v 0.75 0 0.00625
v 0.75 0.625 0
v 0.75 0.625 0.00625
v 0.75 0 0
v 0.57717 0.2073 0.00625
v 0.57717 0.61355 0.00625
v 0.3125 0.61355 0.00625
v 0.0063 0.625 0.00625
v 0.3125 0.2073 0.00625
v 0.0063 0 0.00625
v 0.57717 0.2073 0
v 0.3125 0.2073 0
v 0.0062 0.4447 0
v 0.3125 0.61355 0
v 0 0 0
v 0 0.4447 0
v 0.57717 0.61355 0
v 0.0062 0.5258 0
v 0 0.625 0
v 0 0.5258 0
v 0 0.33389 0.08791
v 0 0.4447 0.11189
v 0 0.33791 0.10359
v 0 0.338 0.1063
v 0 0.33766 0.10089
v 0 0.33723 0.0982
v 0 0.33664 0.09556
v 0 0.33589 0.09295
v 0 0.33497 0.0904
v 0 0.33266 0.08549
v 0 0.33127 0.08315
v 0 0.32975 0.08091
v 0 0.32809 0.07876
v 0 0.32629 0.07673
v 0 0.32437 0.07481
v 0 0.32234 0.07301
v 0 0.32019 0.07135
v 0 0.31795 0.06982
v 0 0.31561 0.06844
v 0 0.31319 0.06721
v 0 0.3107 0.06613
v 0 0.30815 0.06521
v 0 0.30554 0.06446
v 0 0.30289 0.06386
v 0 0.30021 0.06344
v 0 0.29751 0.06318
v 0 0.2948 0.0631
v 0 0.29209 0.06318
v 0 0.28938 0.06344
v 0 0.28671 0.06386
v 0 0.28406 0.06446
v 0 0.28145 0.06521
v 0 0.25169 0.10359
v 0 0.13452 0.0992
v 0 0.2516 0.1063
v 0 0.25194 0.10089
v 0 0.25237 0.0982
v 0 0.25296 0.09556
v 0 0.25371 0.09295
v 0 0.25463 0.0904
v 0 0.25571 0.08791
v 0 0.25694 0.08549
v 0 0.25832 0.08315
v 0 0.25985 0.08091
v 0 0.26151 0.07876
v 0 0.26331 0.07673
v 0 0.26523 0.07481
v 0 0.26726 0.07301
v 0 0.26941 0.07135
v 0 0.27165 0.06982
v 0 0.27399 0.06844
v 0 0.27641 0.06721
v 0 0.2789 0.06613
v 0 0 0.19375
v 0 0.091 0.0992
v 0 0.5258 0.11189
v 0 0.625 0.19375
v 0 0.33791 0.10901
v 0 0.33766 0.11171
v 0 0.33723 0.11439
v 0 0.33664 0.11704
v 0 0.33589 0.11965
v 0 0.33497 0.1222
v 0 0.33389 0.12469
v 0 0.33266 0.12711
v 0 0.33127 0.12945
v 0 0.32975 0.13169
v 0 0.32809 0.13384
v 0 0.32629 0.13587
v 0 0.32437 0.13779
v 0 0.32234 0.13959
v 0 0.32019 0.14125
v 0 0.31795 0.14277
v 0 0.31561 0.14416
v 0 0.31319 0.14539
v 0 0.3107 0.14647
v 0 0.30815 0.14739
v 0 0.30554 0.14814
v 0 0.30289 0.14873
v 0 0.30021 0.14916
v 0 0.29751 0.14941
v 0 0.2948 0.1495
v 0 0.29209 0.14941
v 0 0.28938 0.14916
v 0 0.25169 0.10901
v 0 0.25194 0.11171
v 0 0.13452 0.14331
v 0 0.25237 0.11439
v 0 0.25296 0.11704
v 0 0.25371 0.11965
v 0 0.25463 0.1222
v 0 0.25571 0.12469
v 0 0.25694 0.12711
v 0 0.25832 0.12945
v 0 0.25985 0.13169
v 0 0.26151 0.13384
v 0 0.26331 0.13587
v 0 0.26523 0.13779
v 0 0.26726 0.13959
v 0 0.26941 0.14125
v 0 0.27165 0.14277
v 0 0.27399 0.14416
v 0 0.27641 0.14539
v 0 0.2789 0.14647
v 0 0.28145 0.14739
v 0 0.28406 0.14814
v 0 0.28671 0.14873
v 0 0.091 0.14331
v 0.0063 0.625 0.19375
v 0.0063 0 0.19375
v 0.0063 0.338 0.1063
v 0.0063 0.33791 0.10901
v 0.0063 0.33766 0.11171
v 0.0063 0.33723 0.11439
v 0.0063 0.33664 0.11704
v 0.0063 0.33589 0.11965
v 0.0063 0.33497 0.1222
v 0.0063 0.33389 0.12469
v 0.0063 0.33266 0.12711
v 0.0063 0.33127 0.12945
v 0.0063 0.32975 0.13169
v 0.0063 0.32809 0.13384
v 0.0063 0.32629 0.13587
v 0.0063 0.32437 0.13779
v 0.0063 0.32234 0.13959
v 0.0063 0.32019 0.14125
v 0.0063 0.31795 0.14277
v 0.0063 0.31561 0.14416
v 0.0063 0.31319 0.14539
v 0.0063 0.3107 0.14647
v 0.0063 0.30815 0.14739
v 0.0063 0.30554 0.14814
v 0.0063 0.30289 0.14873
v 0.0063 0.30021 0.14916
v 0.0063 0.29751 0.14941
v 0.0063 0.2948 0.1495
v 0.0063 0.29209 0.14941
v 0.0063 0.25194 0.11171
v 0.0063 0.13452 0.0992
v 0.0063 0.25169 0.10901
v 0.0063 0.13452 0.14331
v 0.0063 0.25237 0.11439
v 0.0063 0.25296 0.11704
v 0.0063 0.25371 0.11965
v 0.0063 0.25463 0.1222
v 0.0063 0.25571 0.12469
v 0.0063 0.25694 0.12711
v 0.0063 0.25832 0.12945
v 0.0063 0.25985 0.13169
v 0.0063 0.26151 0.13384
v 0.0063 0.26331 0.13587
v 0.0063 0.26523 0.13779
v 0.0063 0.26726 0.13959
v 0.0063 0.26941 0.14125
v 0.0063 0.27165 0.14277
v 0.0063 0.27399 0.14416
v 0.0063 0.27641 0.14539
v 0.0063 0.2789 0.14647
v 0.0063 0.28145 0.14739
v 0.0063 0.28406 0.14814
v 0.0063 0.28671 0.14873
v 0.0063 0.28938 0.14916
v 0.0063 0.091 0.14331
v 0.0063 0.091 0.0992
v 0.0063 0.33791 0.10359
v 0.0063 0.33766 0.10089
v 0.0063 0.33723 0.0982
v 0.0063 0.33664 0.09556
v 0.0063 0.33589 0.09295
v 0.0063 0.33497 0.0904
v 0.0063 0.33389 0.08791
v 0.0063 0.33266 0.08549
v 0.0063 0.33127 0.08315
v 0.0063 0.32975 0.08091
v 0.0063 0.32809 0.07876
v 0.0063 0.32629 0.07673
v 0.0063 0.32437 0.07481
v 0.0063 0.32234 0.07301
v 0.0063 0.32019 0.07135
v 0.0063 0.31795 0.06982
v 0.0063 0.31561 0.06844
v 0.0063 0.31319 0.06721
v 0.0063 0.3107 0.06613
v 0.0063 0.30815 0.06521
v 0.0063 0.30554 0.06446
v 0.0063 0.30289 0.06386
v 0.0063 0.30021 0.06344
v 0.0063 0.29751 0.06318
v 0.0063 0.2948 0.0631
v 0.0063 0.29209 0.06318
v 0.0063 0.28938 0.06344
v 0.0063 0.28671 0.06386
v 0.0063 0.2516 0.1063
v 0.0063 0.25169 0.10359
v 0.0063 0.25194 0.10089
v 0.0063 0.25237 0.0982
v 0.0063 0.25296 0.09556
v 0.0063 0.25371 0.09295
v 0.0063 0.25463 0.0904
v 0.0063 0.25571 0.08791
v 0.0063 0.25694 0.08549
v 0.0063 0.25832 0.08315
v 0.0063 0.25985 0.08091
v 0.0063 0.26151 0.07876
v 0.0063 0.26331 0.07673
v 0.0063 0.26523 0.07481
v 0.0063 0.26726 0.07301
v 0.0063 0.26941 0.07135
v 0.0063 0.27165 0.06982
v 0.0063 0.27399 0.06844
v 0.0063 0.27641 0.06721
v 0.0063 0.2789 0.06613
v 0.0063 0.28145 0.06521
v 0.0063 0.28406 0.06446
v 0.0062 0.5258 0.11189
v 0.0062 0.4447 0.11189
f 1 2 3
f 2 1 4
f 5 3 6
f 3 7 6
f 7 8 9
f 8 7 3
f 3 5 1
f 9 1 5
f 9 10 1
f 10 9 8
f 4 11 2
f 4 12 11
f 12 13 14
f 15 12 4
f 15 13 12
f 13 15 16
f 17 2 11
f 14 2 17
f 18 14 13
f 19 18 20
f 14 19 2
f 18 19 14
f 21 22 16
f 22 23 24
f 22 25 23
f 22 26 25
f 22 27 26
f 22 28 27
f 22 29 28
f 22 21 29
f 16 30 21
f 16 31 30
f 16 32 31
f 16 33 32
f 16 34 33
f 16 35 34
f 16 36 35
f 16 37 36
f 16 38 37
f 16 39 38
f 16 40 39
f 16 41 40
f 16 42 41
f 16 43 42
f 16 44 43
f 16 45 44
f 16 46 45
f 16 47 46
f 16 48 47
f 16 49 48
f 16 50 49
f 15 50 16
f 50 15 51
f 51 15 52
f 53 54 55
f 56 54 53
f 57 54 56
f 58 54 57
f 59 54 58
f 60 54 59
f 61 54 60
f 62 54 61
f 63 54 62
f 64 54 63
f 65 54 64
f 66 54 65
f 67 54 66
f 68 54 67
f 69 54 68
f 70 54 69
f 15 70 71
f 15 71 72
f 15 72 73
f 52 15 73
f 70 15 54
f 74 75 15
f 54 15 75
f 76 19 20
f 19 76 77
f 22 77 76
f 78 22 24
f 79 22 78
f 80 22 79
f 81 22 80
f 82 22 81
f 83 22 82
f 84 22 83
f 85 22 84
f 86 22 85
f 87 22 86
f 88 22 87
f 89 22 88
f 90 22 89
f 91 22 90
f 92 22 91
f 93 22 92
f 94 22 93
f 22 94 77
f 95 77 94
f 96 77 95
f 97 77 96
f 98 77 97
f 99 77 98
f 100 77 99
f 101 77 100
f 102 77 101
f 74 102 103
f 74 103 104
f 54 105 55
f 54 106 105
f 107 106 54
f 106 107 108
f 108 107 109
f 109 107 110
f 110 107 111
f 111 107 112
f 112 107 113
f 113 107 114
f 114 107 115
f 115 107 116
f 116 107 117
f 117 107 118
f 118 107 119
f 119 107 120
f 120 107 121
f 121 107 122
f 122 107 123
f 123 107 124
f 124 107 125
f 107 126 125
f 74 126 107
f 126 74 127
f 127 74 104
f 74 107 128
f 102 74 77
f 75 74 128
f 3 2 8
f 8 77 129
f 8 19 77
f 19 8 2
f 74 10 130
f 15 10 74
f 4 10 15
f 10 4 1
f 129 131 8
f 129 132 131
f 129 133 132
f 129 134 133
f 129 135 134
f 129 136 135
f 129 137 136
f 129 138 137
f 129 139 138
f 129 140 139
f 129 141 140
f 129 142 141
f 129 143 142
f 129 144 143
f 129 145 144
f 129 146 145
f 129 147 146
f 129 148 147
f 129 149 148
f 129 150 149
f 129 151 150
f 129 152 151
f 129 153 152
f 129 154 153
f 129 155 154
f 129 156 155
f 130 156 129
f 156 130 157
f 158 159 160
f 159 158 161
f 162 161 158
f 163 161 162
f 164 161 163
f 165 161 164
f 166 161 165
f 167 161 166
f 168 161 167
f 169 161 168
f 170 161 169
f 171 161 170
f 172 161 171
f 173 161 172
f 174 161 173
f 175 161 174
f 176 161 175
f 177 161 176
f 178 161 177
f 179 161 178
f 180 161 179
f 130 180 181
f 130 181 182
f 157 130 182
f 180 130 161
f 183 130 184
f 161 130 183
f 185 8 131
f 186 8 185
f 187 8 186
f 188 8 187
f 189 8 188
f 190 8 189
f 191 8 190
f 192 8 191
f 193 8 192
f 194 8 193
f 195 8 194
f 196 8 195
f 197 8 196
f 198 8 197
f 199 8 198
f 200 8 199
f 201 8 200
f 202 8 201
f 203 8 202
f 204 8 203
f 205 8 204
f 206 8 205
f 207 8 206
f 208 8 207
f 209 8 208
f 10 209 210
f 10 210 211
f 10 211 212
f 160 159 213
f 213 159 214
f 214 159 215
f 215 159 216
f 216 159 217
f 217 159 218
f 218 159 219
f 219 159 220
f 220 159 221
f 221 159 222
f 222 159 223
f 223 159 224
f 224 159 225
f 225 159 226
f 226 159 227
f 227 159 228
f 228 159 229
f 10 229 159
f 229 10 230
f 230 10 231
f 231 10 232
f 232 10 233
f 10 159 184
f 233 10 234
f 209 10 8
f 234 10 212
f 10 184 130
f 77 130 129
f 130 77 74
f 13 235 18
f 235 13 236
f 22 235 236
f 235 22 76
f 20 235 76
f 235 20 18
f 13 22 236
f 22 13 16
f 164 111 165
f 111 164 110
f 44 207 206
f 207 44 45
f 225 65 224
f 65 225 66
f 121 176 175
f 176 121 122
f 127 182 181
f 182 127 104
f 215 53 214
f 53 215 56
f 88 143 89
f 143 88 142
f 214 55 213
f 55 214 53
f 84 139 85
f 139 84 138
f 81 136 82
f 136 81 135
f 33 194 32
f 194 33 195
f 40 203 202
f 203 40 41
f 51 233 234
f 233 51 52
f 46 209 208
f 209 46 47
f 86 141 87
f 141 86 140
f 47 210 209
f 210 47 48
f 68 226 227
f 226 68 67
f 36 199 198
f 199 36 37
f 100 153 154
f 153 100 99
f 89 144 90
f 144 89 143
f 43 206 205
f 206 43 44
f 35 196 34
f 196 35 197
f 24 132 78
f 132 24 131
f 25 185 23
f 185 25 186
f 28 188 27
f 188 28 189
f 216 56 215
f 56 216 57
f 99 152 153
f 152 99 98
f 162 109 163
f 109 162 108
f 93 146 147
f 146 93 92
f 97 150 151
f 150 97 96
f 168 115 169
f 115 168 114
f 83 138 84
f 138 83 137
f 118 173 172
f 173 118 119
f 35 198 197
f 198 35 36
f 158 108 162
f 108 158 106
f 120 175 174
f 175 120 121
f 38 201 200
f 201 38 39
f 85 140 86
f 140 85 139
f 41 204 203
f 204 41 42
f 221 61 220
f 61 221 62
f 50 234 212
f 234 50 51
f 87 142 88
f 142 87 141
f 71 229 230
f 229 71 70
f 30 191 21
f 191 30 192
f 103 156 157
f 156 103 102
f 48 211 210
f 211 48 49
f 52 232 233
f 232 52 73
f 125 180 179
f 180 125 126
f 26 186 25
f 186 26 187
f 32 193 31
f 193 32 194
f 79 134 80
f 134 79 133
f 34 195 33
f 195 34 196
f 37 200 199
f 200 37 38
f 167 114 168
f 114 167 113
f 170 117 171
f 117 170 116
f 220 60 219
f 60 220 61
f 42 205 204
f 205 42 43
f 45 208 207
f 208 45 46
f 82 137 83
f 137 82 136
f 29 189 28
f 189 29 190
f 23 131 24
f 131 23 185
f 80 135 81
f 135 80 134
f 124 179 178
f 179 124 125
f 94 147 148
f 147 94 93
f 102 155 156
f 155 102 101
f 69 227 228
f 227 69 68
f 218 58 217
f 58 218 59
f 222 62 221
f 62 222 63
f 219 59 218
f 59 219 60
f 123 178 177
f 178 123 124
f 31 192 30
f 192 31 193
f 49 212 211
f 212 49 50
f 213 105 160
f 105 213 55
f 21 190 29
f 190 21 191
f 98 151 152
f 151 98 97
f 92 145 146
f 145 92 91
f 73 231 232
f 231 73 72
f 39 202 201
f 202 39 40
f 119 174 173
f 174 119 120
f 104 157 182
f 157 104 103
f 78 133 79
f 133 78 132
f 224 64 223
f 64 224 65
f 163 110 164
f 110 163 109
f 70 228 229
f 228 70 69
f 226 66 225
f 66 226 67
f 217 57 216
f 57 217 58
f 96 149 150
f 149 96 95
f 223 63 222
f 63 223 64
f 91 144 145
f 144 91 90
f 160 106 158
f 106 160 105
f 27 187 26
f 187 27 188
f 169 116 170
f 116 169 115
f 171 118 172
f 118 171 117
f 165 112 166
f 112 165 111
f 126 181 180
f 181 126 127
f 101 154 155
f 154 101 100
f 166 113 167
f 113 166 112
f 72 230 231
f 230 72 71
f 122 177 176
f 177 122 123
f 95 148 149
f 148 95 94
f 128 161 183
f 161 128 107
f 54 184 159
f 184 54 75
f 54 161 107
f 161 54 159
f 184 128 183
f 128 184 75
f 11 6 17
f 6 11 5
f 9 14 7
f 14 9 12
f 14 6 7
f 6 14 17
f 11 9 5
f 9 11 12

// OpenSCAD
$fn = 100;

// Base dimensions
base_len = 0.75;
base_wid = 0.625;
base_ht  = 0.00625;

// Wall dimensions
wall_thick = 0.0063;
wall_ht    = 0.1875;

// Cut 1: Lower rectangular opening
c1_y = 0.4447;
c1_dy = 0.081103;
c1_dz = 0.111891;
c1_dx = 0.0062;

// Cut 2: Circular through-hole
c2_y = 0.2948;
c2_z = 0.1063;
c2_r = 0.0432;
c2_dx = 0.0625;

// Cut 3: Smaller rectangular opening
c3_y = 0.091;
c3_dy = 0.043521;
c3_dz = 0.044108;
c3_dx = 0.0625;

// Cut 4: Horizontal base rectangular opening
c4_x = 0.3125;
c4_y = 0.2073;
c4_dx = 0.264669;
c4_dy = 0.40625;
c4_z = -0.0562;
c4_dz = 0.0625;

module base_plate() {
    cube([base_len, base_wid, base_ht]);
}

module upright_wall() {
    translate([0, 0, base_ht])
        cube([wall_thick, base_wid, wall_ht]);
}

module cut_lower_rect() {
    translate([0, c1_y, 0])
        cube([c1_dx, c1_dy, c1_dz]);
}

module cut_circular_hole() {
    translate([0, c2_y, c2_z])
        rotate([0, 90, 0])
            cylinder(h=c2_dx, r=c2_r, center=true);
}

module cut_small_rect() {
    translate([0, c3_y, 0.0992])
        cube([c3_dx, c3_dy, c3_dz]);
}

module cut_base_rect() {
    translate([c4_x, c4_y, c4_z])
        cube([c4_dx, c4_dy, c4_dz]);
}

difference() {
    union() {
        base_plate();
        upright_wall();
    }
    cut_lower_rect();
    cut_circular_hole();
    cut_small_rect();
    cut_base_rect();
}
